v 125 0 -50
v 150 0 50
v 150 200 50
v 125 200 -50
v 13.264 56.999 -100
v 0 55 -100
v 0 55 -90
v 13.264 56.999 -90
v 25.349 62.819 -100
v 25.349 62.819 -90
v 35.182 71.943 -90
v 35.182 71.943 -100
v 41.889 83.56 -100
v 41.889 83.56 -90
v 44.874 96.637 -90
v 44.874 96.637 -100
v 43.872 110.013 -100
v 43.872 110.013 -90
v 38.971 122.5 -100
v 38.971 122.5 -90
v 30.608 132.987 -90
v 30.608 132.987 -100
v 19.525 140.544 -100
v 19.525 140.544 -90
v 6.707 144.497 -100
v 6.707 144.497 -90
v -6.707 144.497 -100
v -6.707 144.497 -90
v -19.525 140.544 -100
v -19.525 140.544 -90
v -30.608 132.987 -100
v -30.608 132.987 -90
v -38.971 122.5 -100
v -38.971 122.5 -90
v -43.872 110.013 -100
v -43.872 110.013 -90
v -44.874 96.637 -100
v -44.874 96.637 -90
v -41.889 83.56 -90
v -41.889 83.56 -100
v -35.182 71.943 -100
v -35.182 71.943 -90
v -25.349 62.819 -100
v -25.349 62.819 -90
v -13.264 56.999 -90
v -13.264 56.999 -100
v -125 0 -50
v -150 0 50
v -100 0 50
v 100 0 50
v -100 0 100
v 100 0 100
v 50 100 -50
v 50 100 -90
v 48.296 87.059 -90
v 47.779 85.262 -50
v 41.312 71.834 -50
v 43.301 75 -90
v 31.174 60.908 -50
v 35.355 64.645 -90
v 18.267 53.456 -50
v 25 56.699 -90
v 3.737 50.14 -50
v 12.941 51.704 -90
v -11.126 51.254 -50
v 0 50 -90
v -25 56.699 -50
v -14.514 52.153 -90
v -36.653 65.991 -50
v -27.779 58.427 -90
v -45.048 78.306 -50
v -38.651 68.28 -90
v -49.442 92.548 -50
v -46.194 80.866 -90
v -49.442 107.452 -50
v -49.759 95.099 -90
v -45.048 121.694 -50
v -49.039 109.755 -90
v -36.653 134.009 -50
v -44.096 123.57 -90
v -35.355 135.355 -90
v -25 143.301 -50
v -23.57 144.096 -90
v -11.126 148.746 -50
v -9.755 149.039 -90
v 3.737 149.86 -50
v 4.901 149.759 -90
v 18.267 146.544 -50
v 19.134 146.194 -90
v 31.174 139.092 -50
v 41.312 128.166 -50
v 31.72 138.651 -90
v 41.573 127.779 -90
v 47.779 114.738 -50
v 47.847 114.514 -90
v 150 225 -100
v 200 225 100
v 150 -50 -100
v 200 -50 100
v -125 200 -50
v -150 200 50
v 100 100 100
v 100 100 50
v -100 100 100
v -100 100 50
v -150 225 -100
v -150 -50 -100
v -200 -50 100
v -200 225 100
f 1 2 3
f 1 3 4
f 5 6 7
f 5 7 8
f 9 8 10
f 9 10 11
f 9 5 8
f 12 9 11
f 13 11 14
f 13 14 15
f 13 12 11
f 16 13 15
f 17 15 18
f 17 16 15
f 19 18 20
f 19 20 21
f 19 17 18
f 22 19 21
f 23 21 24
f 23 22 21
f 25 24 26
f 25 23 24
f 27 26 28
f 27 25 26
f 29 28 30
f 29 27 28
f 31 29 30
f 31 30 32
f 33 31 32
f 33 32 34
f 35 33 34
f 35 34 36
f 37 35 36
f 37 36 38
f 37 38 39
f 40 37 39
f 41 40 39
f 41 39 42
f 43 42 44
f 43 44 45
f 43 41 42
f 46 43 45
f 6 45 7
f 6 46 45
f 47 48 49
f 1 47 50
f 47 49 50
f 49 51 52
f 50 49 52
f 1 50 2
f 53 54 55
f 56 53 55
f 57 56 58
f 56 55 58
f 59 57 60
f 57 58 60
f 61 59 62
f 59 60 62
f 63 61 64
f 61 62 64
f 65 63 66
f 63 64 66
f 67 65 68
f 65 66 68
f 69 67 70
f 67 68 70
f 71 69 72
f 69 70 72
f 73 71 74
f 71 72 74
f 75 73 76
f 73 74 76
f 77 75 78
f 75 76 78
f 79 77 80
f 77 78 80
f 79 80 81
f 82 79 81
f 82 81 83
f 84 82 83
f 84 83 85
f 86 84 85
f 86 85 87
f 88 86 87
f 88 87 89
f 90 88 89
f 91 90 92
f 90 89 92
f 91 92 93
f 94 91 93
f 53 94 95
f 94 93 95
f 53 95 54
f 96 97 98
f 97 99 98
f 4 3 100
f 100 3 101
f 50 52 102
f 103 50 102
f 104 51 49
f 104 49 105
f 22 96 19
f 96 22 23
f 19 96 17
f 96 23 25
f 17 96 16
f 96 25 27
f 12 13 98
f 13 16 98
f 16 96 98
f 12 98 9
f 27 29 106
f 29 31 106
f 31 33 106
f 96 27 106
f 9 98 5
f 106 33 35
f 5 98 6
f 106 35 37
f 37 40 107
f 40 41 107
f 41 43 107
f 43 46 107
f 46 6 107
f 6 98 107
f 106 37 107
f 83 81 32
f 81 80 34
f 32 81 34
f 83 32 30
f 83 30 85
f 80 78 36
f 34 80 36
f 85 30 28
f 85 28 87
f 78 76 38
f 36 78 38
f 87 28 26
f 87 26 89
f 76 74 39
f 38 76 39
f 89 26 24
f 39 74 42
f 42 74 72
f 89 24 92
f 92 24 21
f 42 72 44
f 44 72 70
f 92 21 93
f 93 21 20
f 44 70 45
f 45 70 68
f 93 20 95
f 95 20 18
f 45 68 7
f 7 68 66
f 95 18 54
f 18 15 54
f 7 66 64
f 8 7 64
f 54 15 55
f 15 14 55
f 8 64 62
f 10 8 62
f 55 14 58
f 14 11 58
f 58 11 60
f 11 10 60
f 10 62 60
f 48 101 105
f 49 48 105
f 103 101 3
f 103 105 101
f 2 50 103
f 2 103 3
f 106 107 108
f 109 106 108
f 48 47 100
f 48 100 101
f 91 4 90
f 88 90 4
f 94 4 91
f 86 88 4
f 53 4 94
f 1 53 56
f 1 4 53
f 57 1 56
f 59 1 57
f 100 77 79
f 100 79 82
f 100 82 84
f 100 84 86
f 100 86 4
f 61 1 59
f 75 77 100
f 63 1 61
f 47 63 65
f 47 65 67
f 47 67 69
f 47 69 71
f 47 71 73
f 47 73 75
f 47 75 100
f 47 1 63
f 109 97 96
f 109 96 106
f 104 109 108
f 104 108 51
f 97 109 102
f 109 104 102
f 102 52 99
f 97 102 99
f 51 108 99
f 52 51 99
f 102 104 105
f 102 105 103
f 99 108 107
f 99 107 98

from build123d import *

# Parameters (mm, degrees)
F1_DEPTH  = 200
F2_R      = 50
F3_DEPTH  = 50
F5_DEPTH  = 10
F7_DEPTH  = 50
F9_DEPTH  = 25
F10_W     = 200
F10_H     = 100
F11_DEPTH = 50


with BuildPart() as f1:
    # F0 (on Front) → F1 (new body)
    with BuildSketch(Plane.XZ):
        Polygon((-150, 50), (150, 50), (137.5, 0), (175, 0), (200, 100), (-200, 100), (-175, 0), (-137.5, 0), align=None)
        Polygon((175, 0), (137.5, 0), (125, -50), (-125, -50), (-137.5, 0), (-175, 0), (-150, -100), (150, -100), align=None)
    extrude(amount=-F1_DEPTH)

    # F2 (on face) → F3 (cut)
    with BuildSketch(Plane(origin=(0, 0, -100), x_dir=(1, 0, 0), z_dir=(0, 0, -1))):
        with Locations((0, -100)):
            Circle(F2_R)
    extrude(amount=-F3_DEPTH, mode=Mode.SUBTRACT)

    # F4 (on face) → F5 (join)
    with BuildSketch(Plane(origin=(0, 0, -100), x_dir=(1, 0, 0), z_dir=(0, 0, -1))):
        with BuildLine():
            ThreePointArc((50, -100), (35.3553390593, -64.6446609407), (0, -50))
            ThreePointArc((0, -50), (-35.3553390593, -135.3553390593), (50, -100))
        make_face()
        with BuildLine():
            ThreePointArc((45, -100), (-31.8198051534, -131.8198051534), (0, -55))
            ThreePointArc((0, -55), (31.8198051534, -68.1801948466), (45, -100))
        make_face(mode=Mode.SUBTRACT)
    extrude(amount=-F5_DEPTH)

    # F6 (on face) → F7 (join)
    with BuildSketch(Plane.XZ):
        Polygon((150, -100), (200, 100), (-200, 100), (-150, -100), align=None)
        Polygon((-125, -50), (-150, 50), (150, 50), (125, -50), align=None, mode=Mode.SUBTRACT)
        Polygon((150, 50), (-150, 50), (-125, -50), (125, -50), align=None)
    extrude(amount=F7_DEPTH)

    # F8 (on face) → F9 (join)
    with BuildSketch(Plane(origin=(0, 200, 0), x_dir=(-1, 0, 0), z_dir=(0, 1, 0))):
        Polygon((150, -100), (200, 100), (-200, 100), (-150, -100), align=None)
        Polygon((-125, -50), (-150, 50), (150, 50), (125, -50), align=None, mode=Mode.SUBTRACT)
        Polygon((150, 50), (-150, 50), (-125, -50), (125, -50), align=None)
    extrude(amount=F9_DEPTH)

    # F10 (on face) → F11 (cut)
    with BuildSketch(Plane.XY.offset(100)):
        with Locations((0, 50)):
            Rectangle(F10_W, F10_H)
    extrude(amount=-F11_DEPTH, mode=Mode.SUBTRACT)


solid = f1.part
